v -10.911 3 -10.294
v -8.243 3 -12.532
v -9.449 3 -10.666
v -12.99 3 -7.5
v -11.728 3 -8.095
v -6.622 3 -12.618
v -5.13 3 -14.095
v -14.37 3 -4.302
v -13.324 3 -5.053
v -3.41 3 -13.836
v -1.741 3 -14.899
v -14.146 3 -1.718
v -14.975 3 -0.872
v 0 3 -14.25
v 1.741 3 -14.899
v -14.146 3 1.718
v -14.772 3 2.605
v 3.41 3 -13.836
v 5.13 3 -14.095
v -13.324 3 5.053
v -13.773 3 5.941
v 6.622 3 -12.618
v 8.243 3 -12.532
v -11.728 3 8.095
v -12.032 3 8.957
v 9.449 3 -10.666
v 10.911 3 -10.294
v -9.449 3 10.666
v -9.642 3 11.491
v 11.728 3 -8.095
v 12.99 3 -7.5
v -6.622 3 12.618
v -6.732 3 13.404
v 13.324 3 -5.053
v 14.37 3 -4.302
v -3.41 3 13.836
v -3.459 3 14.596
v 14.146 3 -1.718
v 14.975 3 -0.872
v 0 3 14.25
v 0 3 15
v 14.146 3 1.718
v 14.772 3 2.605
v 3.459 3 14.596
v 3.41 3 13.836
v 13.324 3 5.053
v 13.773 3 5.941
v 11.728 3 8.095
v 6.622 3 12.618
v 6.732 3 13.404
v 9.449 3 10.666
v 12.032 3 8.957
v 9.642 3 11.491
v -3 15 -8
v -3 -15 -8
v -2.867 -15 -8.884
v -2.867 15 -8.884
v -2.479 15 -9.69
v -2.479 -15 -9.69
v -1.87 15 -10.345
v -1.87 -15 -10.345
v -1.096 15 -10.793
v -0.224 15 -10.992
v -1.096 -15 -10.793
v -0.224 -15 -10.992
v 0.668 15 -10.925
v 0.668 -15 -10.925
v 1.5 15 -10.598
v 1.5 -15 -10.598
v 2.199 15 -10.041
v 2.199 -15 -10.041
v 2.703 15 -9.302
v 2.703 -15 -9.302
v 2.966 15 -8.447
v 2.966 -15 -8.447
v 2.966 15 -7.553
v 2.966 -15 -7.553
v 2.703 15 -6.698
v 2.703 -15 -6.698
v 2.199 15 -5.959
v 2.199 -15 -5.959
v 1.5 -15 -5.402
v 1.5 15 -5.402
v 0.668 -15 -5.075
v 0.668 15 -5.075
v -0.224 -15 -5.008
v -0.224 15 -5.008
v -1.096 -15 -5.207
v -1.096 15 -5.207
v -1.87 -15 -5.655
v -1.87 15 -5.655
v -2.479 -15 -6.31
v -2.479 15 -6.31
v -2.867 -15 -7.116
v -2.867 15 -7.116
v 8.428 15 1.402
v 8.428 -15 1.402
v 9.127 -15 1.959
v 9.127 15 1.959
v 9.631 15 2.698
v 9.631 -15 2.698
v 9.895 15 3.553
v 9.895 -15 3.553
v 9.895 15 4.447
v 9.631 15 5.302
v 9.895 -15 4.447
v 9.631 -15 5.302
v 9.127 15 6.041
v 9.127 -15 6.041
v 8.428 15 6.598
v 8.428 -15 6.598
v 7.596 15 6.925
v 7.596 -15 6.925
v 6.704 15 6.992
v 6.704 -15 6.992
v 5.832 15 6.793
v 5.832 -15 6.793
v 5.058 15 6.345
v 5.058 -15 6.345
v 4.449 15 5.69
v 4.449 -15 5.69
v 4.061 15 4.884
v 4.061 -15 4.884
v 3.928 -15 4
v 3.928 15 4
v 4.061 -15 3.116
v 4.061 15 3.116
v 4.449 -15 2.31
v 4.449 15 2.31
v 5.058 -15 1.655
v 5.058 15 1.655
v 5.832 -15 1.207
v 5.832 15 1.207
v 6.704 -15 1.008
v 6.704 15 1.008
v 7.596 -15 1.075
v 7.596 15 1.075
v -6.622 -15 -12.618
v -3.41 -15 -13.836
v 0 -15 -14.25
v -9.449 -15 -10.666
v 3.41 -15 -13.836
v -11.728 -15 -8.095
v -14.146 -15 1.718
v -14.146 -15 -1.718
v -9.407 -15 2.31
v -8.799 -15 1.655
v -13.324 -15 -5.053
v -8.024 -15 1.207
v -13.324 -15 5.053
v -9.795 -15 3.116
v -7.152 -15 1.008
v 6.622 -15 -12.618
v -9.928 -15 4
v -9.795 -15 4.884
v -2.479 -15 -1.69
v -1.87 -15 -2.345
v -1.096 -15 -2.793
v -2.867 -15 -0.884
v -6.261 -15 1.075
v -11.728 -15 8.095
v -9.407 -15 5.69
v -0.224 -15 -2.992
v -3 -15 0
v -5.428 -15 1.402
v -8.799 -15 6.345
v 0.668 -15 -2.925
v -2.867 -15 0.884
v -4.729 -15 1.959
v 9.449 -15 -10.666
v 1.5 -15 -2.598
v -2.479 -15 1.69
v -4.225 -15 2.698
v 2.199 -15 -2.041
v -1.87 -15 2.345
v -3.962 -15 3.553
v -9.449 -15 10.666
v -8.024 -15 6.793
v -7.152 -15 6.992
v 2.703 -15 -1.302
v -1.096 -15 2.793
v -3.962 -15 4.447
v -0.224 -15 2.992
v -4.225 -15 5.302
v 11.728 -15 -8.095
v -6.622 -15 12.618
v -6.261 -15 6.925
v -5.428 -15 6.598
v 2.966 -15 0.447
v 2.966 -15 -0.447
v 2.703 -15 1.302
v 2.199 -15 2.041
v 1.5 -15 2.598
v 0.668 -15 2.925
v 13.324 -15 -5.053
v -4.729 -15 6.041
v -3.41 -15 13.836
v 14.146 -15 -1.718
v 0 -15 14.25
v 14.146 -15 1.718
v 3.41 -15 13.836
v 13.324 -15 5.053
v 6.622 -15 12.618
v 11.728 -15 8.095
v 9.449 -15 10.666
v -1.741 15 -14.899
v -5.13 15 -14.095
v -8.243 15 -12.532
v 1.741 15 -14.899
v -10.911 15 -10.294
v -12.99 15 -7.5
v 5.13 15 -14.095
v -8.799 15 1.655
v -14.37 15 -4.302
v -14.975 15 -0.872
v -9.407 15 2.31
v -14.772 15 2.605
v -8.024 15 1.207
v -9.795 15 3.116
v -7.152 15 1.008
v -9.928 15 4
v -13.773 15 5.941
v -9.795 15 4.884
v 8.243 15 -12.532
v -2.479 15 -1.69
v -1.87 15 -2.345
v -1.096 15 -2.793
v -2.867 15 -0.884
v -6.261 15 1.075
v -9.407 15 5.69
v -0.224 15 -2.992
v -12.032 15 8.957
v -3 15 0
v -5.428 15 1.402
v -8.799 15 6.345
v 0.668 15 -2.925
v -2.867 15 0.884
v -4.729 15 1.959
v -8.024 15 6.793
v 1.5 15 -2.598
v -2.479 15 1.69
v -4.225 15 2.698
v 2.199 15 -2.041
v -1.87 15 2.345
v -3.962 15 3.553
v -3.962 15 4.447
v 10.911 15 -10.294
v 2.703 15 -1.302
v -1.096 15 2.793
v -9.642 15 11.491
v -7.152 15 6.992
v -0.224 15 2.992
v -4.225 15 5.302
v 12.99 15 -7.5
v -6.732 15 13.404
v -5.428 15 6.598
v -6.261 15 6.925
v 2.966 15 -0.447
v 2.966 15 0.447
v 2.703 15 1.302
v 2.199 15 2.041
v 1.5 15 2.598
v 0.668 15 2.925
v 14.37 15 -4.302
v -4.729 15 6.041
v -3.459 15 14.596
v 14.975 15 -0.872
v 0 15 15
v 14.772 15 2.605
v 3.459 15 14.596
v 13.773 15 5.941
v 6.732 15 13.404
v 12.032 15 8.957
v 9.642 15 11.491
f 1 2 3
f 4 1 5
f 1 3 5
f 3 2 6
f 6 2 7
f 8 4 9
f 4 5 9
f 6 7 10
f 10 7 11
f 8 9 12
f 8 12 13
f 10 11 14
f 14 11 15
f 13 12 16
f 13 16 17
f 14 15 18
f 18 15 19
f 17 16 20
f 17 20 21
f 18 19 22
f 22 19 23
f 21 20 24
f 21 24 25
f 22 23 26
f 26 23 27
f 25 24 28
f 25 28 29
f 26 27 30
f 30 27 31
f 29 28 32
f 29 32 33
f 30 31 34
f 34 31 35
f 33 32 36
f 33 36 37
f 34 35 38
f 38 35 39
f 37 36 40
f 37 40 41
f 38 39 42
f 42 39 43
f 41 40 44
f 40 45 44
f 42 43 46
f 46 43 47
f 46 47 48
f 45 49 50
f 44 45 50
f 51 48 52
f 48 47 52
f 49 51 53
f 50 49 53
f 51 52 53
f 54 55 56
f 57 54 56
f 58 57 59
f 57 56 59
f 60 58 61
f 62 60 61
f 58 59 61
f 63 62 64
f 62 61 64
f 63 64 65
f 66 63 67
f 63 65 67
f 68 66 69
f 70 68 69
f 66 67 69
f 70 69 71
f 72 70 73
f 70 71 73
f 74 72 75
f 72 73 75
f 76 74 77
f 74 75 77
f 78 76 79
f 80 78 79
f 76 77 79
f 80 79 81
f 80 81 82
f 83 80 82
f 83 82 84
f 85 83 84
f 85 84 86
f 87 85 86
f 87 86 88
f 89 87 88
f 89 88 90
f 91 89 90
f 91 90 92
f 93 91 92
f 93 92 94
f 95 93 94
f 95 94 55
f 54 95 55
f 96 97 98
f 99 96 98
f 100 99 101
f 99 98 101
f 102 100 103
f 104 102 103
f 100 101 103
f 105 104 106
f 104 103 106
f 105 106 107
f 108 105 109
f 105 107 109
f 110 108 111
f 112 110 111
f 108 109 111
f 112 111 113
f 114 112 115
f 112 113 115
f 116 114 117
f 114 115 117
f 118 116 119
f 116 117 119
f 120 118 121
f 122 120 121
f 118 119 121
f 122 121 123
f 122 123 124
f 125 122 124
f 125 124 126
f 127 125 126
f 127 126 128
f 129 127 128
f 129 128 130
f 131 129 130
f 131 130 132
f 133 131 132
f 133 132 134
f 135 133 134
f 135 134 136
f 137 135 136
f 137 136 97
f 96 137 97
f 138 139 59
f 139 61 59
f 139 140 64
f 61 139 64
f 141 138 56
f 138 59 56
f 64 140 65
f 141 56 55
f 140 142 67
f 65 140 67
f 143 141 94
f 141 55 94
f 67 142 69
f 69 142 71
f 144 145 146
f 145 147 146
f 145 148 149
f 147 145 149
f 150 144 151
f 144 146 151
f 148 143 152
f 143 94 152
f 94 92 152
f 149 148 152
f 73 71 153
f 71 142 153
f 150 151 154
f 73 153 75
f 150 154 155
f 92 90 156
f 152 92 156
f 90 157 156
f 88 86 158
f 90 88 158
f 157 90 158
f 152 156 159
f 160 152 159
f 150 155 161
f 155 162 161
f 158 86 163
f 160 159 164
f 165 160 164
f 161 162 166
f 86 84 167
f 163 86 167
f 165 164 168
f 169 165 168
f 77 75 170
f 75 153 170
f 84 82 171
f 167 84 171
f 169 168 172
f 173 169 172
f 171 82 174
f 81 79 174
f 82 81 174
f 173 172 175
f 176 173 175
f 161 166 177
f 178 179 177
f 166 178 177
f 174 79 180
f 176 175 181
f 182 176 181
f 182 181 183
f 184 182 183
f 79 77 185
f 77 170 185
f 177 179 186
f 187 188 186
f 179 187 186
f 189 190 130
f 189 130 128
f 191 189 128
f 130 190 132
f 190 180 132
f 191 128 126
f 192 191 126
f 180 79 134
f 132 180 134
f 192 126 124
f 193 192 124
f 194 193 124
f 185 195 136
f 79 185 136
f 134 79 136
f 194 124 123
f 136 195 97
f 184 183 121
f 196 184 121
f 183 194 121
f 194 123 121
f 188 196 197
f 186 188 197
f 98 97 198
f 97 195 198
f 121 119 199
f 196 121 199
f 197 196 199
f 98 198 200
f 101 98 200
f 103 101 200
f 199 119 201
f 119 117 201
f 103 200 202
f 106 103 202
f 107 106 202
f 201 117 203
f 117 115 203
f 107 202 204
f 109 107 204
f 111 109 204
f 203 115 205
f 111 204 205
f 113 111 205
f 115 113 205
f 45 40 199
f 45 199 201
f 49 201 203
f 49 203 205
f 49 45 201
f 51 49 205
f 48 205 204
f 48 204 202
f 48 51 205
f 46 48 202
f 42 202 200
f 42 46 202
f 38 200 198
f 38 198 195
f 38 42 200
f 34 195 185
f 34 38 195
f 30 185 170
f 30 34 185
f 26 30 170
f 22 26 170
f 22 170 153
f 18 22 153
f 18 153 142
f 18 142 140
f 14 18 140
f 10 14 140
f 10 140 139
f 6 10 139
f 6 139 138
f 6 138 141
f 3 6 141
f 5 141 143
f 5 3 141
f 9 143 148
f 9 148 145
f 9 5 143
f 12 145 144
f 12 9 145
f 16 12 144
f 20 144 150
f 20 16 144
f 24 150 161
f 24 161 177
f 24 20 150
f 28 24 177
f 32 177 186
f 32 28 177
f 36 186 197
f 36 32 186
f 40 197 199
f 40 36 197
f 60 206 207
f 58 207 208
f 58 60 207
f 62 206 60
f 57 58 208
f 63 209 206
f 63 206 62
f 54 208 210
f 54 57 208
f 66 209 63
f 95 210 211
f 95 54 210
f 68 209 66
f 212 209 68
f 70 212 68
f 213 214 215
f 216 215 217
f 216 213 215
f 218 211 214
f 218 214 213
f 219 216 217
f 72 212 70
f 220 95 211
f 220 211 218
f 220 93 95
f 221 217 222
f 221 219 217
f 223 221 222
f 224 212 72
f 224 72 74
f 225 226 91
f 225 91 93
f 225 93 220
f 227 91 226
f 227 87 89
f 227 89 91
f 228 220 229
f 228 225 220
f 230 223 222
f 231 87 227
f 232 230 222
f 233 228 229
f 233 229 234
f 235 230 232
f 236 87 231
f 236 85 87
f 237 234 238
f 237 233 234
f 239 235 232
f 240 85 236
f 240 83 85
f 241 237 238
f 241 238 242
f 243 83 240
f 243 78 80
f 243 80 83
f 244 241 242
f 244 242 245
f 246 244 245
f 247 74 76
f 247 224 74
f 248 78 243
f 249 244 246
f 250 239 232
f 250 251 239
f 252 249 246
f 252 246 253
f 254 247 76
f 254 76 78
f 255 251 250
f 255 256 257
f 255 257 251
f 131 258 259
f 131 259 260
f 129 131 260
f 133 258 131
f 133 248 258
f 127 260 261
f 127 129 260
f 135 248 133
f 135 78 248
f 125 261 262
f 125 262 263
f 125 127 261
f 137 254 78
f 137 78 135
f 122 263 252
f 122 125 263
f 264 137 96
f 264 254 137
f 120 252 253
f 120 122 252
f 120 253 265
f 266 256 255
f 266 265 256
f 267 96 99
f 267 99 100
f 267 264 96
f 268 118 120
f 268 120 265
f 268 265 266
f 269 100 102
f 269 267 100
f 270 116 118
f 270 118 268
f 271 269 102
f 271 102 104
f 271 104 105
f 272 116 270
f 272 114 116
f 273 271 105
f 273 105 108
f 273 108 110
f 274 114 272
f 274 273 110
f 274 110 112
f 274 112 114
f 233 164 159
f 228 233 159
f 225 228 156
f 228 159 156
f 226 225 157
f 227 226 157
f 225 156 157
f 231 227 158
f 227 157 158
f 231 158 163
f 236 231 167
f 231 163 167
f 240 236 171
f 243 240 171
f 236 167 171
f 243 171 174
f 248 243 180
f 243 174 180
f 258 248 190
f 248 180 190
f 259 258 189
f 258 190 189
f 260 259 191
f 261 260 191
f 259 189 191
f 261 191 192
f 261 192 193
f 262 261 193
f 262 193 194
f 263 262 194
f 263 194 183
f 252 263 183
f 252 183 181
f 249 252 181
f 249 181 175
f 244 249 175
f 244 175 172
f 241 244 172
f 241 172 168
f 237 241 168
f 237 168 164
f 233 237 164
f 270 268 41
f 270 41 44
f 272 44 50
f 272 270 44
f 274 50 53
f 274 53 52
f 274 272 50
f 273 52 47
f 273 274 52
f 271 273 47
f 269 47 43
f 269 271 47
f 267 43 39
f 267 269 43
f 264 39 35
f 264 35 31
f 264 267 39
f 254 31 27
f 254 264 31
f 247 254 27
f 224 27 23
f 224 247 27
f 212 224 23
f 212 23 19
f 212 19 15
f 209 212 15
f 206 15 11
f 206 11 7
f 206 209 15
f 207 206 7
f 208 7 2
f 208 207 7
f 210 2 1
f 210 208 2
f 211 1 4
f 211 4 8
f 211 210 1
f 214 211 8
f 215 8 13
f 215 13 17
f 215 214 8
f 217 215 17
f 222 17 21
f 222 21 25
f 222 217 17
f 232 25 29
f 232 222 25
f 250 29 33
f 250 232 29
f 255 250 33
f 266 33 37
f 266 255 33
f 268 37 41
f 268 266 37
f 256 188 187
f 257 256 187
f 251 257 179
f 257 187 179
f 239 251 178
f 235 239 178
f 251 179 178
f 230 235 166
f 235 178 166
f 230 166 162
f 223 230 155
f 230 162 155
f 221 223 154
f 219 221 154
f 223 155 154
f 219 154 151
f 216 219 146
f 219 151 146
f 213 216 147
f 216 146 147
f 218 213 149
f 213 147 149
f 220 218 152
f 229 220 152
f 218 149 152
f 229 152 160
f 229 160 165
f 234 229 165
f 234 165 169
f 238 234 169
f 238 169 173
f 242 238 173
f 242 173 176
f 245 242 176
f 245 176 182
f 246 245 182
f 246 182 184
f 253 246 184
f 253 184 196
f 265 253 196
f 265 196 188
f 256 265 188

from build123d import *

# Parameters (mm, degrees)
SKETCH_1_R               = 14.25
EXTRUDE_1_DEPTH          = 15
HOLE_WIZARD_6_0_6_1_D    = 6
HOLE_WIZARD_6_0_6_2_D    = 6
PATTERN_CIRCULAR_1_COUNT = 3
SKETCH_6_R               = 15
SKETCH_6_R_2             = 14.25
EXTRUDE_2_DEPTH          = 12


with BuildPart() as part:
    # 스케치1 → 보스-돌출1 (new, symmetric)
    with BuildSketch(Plane(origin=(0, 0, 0), x_dir=(1, 0, 0), z_dir=(0, 1, 0))):
        with Locations(Location((0, 0, 0), (0, 0, 270))):
            Circle(SKETCH_1_R)
    extrude(amount=EXTRUDE_1_DEPTH, both=True)

    # Ø6.0 (6) 지름 구멍1 (through all)
    with Locations(Plane(origin=(0, 15, 0), x_dir=(1, 0, 0), z_dir=(0, 1, 0))):
        with Locations((0, 0)):
            Hole(HOLE_WIZARD_6_0_6_1_D / 2)

    # Ø6.0 (6) 지름 구멍2 (through all)
    with Locations(Plane(origin=(0, 15, 0), x_dir=(1, 0, 0), z_dir=(0, 1, 0))):
        with Locations((0, 8)):
            hole_wizard_6_0_6_2 = Hole(HOLE_WIZARD_6_0_6_2_D / 2)

    # 원형 패턴1: Ø6.0 (6) 지름 구멍2 ×3 about axis
    pattern_circular_1_axis = Axis((0, 0, 0), (0, 1, 0))
    for i in range(1, PATTERN_CIRCULAR_1_COUNT):
        add(hole_wizard_6_0_6_2.rotate(pattern_circular_1_axis, i * 360 / PATTERN_CIRCULAR_1_COUNT), mode=Mode.SUBTRACT)

    # 스케치6 → 보스-돌출2 (add)
    with BuildSketch(Plane(origin=(0, 15, 0), x_dir=(1, 0, 0), z_dir=(0, 1, 0))):
        with Locations(Location((0, 0, 0), (0, 0, 270))):
            Circle(SKETCH_6_R)
        with Locations(Location((0, 0, 0), (0, 0, 270))):
            Circle(SKETCH_6_R_2, mode=Mode.SUBTRACT)
    extrude(amount=-EXTRUDE_2_DEPTH)


solid = part.part
